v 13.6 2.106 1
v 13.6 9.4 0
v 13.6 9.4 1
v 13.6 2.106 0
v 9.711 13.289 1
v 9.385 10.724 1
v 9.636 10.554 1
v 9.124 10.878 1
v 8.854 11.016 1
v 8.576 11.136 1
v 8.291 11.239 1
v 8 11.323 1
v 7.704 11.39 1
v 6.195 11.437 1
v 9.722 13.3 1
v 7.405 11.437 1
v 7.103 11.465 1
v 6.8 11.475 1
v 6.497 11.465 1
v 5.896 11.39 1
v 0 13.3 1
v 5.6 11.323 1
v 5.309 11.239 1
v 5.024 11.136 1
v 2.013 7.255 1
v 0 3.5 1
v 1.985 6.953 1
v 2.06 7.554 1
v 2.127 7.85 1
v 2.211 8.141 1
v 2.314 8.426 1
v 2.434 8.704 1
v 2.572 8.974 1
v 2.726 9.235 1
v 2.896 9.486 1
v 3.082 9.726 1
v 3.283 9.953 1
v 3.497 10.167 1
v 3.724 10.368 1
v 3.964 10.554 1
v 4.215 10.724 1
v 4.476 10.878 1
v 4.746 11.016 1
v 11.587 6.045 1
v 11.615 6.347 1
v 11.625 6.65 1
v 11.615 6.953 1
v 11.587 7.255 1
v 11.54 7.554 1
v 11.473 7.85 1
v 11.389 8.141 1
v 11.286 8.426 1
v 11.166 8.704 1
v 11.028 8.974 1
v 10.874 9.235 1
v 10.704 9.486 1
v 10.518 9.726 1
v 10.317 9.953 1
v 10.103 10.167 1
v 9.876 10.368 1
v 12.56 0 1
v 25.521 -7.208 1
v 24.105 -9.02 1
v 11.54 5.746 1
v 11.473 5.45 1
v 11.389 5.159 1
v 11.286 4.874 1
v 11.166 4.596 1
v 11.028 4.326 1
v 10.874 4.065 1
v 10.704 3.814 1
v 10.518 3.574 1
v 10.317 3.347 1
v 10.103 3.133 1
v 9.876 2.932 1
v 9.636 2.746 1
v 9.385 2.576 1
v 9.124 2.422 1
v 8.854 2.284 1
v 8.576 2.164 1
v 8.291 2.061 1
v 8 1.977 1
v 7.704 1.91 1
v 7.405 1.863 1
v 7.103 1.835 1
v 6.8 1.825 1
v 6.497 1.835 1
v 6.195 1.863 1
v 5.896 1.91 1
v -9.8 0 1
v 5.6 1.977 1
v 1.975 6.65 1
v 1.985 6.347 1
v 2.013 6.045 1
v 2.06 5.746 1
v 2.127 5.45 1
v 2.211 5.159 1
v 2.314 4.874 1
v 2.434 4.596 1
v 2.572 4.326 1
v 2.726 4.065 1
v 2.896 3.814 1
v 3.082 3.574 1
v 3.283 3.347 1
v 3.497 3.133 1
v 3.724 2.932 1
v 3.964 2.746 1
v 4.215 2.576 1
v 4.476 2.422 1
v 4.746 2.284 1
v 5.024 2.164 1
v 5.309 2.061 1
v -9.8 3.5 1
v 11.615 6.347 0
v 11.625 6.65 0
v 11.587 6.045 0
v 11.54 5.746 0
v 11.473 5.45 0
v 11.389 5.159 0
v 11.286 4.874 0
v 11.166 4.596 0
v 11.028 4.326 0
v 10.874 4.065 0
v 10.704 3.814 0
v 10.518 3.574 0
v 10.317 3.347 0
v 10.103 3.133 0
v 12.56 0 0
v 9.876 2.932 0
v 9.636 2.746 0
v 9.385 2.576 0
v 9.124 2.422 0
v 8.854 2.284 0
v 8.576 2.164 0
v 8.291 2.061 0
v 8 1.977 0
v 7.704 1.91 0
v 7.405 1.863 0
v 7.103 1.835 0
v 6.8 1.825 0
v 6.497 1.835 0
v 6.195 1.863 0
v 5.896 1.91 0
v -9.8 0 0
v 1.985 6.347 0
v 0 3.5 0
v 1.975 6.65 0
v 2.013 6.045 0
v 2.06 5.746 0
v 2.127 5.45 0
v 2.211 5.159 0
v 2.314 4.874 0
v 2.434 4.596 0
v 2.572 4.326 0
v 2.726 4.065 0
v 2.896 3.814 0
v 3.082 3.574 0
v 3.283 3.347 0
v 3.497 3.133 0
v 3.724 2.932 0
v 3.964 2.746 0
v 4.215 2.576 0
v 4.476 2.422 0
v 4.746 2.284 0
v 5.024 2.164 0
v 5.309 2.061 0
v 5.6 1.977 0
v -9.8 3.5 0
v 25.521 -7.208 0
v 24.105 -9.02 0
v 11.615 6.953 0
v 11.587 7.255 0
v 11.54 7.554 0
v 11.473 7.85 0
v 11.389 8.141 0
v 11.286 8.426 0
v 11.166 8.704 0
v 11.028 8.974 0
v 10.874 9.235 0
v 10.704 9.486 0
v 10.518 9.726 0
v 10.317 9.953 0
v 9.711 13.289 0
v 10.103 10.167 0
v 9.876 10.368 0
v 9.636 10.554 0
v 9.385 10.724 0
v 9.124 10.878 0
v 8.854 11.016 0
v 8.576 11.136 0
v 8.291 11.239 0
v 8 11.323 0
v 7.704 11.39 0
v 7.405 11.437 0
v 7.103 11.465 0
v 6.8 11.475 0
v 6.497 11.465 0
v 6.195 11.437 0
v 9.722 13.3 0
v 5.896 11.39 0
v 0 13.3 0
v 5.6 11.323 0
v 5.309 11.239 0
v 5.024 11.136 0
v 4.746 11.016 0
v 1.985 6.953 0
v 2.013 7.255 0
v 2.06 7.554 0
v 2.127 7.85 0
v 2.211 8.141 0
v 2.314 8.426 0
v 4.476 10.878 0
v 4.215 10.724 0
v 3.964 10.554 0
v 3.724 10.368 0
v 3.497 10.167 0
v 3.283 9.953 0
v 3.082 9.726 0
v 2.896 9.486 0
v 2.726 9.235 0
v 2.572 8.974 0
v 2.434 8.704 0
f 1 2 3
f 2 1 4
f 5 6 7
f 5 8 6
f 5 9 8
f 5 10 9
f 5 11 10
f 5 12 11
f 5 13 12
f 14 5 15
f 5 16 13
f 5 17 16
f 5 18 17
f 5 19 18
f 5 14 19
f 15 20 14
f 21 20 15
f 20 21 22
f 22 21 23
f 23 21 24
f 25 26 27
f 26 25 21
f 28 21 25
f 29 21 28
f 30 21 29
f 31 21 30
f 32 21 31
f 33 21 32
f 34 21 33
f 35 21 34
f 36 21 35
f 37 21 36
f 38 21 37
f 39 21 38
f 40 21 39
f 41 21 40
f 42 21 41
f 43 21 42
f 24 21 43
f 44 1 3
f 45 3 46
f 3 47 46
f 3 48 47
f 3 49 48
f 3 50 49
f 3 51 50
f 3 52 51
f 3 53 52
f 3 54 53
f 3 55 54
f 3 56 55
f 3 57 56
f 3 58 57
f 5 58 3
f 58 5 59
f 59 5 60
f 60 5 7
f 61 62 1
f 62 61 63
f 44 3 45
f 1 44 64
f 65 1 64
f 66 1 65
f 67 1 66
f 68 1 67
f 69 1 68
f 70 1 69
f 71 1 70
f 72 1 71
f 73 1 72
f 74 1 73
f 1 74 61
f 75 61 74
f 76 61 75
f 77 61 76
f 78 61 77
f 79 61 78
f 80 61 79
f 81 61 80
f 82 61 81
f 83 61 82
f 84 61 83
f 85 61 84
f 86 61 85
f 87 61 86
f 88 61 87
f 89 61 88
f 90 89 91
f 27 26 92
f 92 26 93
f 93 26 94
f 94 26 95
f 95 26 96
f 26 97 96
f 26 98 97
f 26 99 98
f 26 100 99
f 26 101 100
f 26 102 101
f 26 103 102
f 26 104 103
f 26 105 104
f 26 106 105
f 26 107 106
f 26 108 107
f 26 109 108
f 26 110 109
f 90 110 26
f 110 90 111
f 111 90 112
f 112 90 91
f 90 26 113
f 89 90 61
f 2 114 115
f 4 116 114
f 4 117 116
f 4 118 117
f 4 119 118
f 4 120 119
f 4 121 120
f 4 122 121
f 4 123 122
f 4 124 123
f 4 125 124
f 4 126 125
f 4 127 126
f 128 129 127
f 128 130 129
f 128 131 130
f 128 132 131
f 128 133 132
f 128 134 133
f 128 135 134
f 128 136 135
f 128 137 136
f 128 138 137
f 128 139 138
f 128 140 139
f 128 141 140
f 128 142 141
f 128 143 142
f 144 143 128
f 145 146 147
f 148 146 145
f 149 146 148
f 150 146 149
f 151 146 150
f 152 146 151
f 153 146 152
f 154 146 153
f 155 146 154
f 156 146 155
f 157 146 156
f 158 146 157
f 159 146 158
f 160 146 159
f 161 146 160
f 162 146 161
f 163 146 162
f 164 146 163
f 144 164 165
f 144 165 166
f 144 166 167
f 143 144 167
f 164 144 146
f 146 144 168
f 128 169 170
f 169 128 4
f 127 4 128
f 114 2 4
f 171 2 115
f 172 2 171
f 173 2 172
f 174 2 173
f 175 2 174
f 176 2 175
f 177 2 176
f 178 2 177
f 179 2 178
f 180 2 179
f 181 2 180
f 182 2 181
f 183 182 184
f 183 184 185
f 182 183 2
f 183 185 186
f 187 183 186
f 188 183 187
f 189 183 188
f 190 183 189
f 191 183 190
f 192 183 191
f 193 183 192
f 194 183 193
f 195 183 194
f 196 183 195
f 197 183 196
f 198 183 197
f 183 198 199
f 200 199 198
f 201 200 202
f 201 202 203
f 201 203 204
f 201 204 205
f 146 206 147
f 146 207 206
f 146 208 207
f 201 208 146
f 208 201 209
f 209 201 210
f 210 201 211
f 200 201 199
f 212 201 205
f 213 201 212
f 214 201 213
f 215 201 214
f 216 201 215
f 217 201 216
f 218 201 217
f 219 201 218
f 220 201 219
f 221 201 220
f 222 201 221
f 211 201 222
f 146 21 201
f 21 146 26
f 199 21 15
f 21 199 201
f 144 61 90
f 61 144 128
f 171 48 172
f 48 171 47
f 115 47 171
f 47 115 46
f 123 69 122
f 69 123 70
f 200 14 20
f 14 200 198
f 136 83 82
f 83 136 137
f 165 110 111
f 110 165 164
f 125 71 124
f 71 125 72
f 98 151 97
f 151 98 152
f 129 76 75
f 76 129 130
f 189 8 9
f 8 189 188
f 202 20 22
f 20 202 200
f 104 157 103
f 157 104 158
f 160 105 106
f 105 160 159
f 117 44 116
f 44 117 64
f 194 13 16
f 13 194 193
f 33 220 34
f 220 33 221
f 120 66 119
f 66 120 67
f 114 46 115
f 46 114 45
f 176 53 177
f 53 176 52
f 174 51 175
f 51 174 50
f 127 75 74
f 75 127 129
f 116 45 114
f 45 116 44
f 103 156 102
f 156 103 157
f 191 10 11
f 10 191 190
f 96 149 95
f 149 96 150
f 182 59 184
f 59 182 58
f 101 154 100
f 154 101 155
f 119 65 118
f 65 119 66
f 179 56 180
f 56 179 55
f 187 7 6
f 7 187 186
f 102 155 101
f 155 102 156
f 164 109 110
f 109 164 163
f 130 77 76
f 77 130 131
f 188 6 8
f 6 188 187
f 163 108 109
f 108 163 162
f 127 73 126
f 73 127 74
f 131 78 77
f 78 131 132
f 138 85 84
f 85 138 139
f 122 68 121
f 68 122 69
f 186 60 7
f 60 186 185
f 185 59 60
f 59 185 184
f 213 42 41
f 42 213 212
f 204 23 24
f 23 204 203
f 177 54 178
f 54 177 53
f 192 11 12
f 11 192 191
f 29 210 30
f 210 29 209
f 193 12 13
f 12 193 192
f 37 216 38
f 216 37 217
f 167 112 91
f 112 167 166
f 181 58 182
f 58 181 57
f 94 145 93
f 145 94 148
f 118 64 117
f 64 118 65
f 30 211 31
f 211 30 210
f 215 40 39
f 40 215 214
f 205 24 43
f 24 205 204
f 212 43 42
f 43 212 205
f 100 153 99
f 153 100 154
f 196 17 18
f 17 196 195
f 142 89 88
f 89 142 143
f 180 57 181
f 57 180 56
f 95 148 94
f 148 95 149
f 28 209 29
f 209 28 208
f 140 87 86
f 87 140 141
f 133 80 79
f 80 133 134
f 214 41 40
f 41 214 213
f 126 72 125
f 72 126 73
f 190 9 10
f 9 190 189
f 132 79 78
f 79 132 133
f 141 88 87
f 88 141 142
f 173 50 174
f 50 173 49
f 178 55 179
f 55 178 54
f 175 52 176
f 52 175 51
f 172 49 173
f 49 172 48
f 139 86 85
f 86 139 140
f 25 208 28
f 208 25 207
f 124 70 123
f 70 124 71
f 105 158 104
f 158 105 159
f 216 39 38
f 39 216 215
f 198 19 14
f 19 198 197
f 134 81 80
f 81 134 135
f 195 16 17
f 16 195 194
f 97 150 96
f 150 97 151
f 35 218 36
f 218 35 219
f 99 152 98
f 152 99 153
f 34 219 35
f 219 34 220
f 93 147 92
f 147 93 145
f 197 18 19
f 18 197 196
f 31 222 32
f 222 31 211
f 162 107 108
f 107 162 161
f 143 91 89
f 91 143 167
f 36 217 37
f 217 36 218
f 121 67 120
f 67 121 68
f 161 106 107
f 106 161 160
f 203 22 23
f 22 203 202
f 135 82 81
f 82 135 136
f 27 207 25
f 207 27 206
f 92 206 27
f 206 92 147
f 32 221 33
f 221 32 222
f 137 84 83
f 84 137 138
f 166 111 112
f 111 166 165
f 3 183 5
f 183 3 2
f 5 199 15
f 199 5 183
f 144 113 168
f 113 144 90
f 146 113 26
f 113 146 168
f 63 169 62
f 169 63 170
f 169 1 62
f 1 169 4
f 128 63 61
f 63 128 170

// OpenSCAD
$fn = 100;

difference(){
cube([13.6,13.3,1]);
translate([13.6/2,13.3/2,-2]){
cylinder(d=9.65,h=6);
}
translate([13.6,9.4,-5]){
rotate([0,0,45]){
cube([5.5,5.5,10]);
}
}
}

translate([-9.8,0,0]){
cube([9.8,3.5,1]);
}

translate([10,2,0]){
rotate([0,0,-38]){
cube([17.9,2.3,1]);
}
}
